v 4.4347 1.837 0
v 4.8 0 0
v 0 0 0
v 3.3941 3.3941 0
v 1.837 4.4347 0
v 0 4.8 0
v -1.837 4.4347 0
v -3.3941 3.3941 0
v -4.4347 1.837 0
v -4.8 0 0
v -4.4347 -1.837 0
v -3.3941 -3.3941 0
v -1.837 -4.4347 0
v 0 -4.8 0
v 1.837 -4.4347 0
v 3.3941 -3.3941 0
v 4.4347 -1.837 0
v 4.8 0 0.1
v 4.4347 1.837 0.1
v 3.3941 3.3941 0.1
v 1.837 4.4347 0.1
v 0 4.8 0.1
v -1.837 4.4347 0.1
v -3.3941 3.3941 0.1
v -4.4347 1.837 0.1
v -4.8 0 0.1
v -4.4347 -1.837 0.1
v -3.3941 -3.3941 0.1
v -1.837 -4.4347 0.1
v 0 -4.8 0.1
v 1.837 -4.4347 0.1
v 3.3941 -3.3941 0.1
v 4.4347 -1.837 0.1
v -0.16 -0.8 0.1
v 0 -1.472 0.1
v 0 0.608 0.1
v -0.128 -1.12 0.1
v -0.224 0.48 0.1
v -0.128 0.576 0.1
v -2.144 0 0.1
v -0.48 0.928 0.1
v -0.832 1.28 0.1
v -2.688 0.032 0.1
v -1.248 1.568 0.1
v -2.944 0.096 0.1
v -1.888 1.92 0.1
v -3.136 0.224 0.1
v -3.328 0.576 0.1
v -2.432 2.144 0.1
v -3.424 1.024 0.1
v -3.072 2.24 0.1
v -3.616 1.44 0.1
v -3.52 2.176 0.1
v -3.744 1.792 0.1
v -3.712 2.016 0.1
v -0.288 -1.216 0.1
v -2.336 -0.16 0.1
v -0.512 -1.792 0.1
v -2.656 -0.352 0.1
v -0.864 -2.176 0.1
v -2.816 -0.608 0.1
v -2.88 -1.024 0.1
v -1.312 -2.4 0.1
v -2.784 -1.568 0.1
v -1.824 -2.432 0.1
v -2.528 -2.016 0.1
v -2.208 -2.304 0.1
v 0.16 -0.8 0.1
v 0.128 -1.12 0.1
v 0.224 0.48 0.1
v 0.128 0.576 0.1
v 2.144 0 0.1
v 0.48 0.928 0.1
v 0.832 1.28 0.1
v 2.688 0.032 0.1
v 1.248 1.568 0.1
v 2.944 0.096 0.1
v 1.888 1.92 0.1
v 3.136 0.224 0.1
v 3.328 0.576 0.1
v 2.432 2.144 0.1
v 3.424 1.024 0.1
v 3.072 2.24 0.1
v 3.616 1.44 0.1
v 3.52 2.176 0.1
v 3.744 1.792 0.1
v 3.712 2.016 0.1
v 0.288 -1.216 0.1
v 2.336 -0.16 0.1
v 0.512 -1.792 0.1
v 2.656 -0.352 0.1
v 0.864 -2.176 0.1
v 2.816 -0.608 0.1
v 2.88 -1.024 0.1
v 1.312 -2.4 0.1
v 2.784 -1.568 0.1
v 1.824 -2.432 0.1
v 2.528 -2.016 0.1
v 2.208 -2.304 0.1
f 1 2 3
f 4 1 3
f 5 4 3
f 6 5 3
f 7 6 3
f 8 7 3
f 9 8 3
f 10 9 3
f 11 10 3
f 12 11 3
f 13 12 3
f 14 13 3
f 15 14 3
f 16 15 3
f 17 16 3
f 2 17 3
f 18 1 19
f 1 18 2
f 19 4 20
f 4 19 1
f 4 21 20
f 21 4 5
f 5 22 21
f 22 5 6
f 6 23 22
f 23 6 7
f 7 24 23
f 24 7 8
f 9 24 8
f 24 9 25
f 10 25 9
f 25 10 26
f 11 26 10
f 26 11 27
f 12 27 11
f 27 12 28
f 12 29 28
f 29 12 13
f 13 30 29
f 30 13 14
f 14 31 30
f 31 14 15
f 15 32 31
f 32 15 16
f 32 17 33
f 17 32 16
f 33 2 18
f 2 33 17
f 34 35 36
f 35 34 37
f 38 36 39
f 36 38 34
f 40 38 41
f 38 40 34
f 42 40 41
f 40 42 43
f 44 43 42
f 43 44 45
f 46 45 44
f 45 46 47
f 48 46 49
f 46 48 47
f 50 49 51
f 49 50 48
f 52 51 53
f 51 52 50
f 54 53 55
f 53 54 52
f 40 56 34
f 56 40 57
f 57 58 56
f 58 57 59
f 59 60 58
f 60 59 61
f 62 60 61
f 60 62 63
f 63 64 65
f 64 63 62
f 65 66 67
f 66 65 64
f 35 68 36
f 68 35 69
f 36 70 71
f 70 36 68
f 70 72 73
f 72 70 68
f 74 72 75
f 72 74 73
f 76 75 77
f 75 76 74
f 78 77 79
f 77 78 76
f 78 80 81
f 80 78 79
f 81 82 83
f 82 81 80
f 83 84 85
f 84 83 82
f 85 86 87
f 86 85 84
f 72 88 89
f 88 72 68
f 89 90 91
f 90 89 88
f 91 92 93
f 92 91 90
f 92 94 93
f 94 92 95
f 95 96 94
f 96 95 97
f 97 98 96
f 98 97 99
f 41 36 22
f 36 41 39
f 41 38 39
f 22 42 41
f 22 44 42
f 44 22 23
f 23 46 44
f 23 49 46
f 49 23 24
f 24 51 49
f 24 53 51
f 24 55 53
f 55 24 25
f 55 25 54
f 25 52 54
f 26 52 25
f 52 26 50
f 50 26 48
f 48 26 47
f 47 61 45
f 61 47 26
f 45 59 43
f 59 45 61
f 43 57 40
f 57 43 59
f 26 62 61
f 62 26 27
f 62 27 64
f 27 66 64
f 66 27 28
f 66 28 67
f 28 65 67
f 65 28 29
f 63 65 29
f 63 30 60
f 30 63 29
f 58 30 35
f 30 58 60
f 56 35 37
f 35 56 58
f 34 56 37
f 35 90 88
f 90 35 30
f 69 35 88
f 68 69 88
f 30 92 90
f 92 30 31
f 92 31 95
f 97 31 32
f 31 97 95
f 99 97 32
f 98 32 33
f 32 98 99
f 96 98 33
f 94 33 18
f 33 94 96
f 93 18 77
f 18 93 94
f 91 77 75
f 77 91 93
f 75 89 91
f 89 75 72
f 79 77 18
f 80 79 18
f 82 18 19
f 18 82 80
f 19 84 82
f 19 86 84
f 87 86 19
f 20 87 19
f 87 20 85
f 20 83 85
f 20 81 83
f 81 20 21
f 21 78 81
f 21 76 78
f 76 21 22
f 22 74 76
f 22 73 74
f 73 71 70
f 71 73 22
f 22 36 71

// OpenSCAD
// file: ../p/empty.scad
use <../lib.scad>
function ldraw_lib__empty() = [
// 0 Empty
// 0 Name: empty.dat
// 0 Author: Steffen [Steffen]
// 0 !LDRAW_ORG Primitive UPDATE 2015-01
// 0 !LICENSE Licensed under CC BY 4.0 : see CAreadme.txt
// 
// 0 BFC CERTIFY CCW
  [0,"BFC","CERTIFY"],
  [0,"BFC","CCW"],
// 
// 0 !HISTORY 2015-10-11 [PTadmin] Official Update 2015-01
// 
// 
// 0 // Tool MLCad cannot handle really empty files. This file is used as a workaround.
// 0 // It exceptionally contains forbidden non-LDRAW standard syntax to satisfy MLCad until it is fixed OR a different editor has become the de-facto LDRAW standard.
// 0 // The line being used here is an "impossible" conditional line which never should be visible,
// 0 // additionally hidden by a syntax explicitly hiding it from displaying.
// 
// 0 MLCAD HIDE 5 24 0 0 0 0.0001 0 0 0.0001 -0.0001 0 0 0 0
];
module ldraw_lib__empty(step=0, col=false, unit=2/5, alt=false, line=0.2, solid=!$preview)
    makepoly(ldraw_lib__empty(), step=step, col=col, unit=unit, alt=alt, line=line, solid=solid);
ldraw_lib__empty(line=0.2);
// file: ../p/1-16chrd.scad
use <../lib.scad>
use <empty.scad>
function ldraw_lib__1_16chrd() = [
// 0 Chord 0.0625
// 0 Name: 1-16chrd.dat
// 0 Author: Philippe Hurbain [Philo]
// 0 !LDRAW_ORG Primitive UPDATE 2015-01
// 0 !LICENSE Licensed under CC BY 4.0 : see CAreadme.txt
// 
// 0 BFC CERTIFY CCW
  [0,"BFC","CERTIFY"],
  [0,"BFC","CCW"],
// 
// 0 !HISTORY 2015-10-11 [PTadmin] Official Update 2015-01
// 
// 
// 0 // This file is intentionally empty because at the current \P resolution,
// 0 // an 1-16chrd is actually empty. However, this file still is present
// 0 // to allow tools to do primitives substition and fill in a real chrd here,
// 0 // or, if desired, to substitute this with the hi-res 48\1-16chrd.
// 
// 0 // This file is based on an idea by Darats at http://forums.ldraw.org/read.php?19,14500,14500#msg-14500
// 
// 1 16 0 0 0 1 0 0 0 1 0 0 0 1 empty.dat
  [1,16,0,0,0,1,0,0,0,1,0,0,0,1, ldraw_lib__empty()],
];
module ldraw_lib__1_16chrd(step=0, col=false, unit=2/5, alt=false, line=0.2, solid=!$preview)
    makepoly(ldraw_lib__1_16chrd(), step=step, col=col, unit=unit, alt=alt, line=line, solid=solid);
ldraw_lib__1_16chrd(line=0.2);
// file: ../p/4-4ering.scad
use <../lib.scad>
use <1-16chrd.scad>
function ldraw_lib__4_4ering() = [
// 0 Adapter Ring Triangles to Normal 1.0
// 0 Name: 4-4ering.dat
// 0 Author: Philippe Hurbain [Philo]
// 0 !LDRAW_ORG Primitive UPDATE 2015-01
// 0 !LICENSE Licensed under CC BY 4.0 : see CAreadme.txt
// 
// 0 BFC CERTIFY CCW
  [0,"BFC","CERTIFY"],
  [0,"BFC","CCW"],
// 
// 0 !HISTORY 2015-10-11 [PTadmin] Official Update 2015-01
// 
// 
// 0 // This file uses 1-16chrd (actually empty). It allows
// 0 // tools to do primitives substition and fill in a ring of chrd here,
// 0 // or, if desired, to substitute this with the hi-res 48\1-16chrd.
// 0 // This file is based on an idea by Darats at http://forums.ldraw.org/read.php?19,14500,14500#msg-14500
// 
// 1 16 0 0 0 1 0 0 0 1 0 0 0 1 1-16chrd.dat
  [1,16,0,0,0,1,0,0,0,1,0,0,0,1, ldraw_lib__1_16chrd()],
// 1 16 0 0 0 0.92388 0 0.38268 0 1 0 -0.38268 0 0.92388 1-16chrd.dat
  [1,16,0,0,0,0.92388,0,0.38268,0,1,0,-0.38268,0,0.92388, ldraw_lib__1_16chrd()],
// 1 16 0 0 0 0.70711 0 0.70711 0 1 0 -0.70711 0 0.70711 1-16chrd.dat
  [1,16,0,0,0,0.70711,0,0.70711,0,1,0,-0.70711,0,0.70711, ldraw_lib__1_16chrd()],
// 1 16 0 0 0 0.38268 0 0.92388 0 1 0 -0.92388 0 0.38268 1-16chrd.dat
  [1,16,0,0,0,0.38268,0,0.92388,0,1,0,-0.92388,0,0.38268, ldraw_lib__1_16chrd()],
// 1 16 0 0 0 0 0 1 0 1 0 -1 0 0 1-16chrd.dat
  [1,16,0,0,0,0,0,1,0,1,0,-1,0,0, ldraw_lib__1_16chrd()],
// 1 16 0 0 0 -0.38268 0 0.92388 0 1 0 -0.92388 0 -0.38268 1-16chrd.dat
  [1,16,0,0,0,-0.38268,0,0.92388,0,1,0,-0.92388,0,-0.38268, ldraw_lib__1_16chrd()],
// 1 16 0 0 0 -0.70711 0 0.70711 0 1 0 -0.70711 0 -0.70711 1-16chrd.dat
  [1,16,0,0,0,-0.70711,0,0.70711,0,1,0,-0.70711,0,-0.70711, ldraw_lib__1_16chrd()],
// 1 16 0 0 0 -0.92388 0 0.38268 0 1 0 -0.38268 0 -0.92388 1-16chrd.dat
  [1,16,0,0,0,-0.92388,0,0.38268,0,1,0,-0.38268,0,-0.92388, ldraw_lib__1_16chrd()],
// 1 16 0 0 0 0 0 -1 0 1 0 1 0 0 1-16chrd.dat
  [1,16,0,0,0,0,0,-1,0,1,0,1,0,0, ldraw_lib__1_16chrd()],
// 1 16 0 0 0 0.38268 0 -0.92388 0 1 0 0.92388 0 0.38268 1-16chrd.dat
  [1,16,0,0,0,0.38268,0,-0.92388,0,1,0,0.92388,0,0.38268, ldraw_lib__1_16chrd()],
// 1 16 0 0 0 0.70711 0 -0.70711 0 1 0 0.70711 0 0.70711 1-16chrd.dat
  [1,16,0,0,0,0.70711,0,-0.70711,0,1,0,0.70711,0,0.70711, ldraw_lib__1_16chrd()],
// 1 16 0 0 0 0.92388 0 -0.38268 0 1 0 0.38268 0 0.92388 1-16chrd.dat
  [1,16,0,0,0,0.92388,0,-0.38268,0,1,0,0.38268,0,0.92388, ldraw_lib__1_16chrd()],
// 1 16 0 0 0 -1 0 0 0 1 0 0 0 -1 1-16chrd.dat
  [1,16,0,0,0,-1,0,0,0,1,0,0,0,-1, ldraw_lib__1_16chrd()],
// 1 16 0 0 0 -0.92388 0 -0.38268 0 1 0 0.38268 0 -0.92388 1-16chrd.dat
  [1,16,0,0,0,-0.92388,0,-0.38268,0,1,0,0.38268,0,-0.92388, ldraw_lib__1_16chrd()],
// 1 16 0 0 0 -0.70711 0 -0.70711 0 1 0 0.70711 0 -0.70711 1-16chrd.dat
  [1,16,0,0,0,-0.70711,0,-0.70711,0,1,0,0.70711,0,-0.70711, ldraw_lib__1_16chrd()],
// 1 16 0 0 0 -0.38268 0 -0.92388 0 1 0 0.92388 0 -0.38268 1-16chrd.dat
  [1,16,0,0,0,-0.38268,0,-0.92388,0,1,0,0.92388,0,-0.38268, ldraw_lib__1_16chrd()],
];
module ldraw_lib__4_4ering(step=0, col=false, unit=2/5, alt=false, line=0.2, solid=!$preview)
    makepoly(ldraw_lib__4_4ering(), step=step, col=col, unit=unit, alt=alt, line=line, solid=solid);
ldraw_lib__4_4ering(line=0.2);
// file: ../p/4-4disc.scad
use <../lib.scad>
function ldraw_lib__4_4disc() = [
// 0 Disc 1.0
// 0 Name: 4-4disc.dat
// 0 Author: James Jessiman
// 0 !LDRAW_ORG Primitive UPDATE 2002-02
// 0 !LICENSE Licensed under CC BY 4.0 : see CAreadme.txt
// 
// 0 BFC CERTIFY CCW
  [0,"BFC","CERTIFY"],
  [0,"BFC","CCW"],
// 
// 0 !HISTORY 1998-12-15 [PTadmin] Official Update 1998-10
// 0 !HISTORY 2002-03-23 [sbliss] Added BFC statement
// 0 !HISTORY 2002-04-25 [PTadmin] Official Update 2002-02
// 0 !HISTORY 2007-06-24 [PTadmin] Header formatted for Contributor Agreement
// 0 !HISTORY 2008-07-01 [PTadmin] Official Update 2008-01
// 
// 
// 3 16 0 0 0 1 0 0 0.9239 0 0.3827
  [3,16,0,0,0,1,0,0,0.9239,0,0.3827],
// 3 16 0 0 0 0.9239 0 0.3827 0.7071 0 0.7071
  [3,16,0,0,0,0.9239,0,0.3827,0.7071,0,0.7071],
// 3 16 0 0 0 0.7071 0 0.7071 0.3827 0 0.9239
  [3,16,0,0,0,0.7071,0,0.7071,0.3827,0,0.9239],
// 3 16 0 0 0 0.3827 0 0.9239 0 0 1
  [3,16,0,0,0,0.3827,0,0.9239,0,0,1],
// 3 16 0 0 0 0 0 1 -0.3827 0 0.9239
  [3,16,0,0,0,0,0,1,-0.3827,0,0.9239],
// 3 16 0 0 0 -0.3827 0 0.9239 -0.7071 0 0.7071
  [3,16,0,0,0,-0.3827,0,0.9239,-0.7071,0,0.7071],
// 3 16 0 0 0 -0.7071 0 0.7071 -0.9239 0 0.3827
  [3,16,0,0,0,-0.7071,0,0.7071,-0.9239,0,0.3827],
// 3 16 0 0 0 -0.9239 0 0.3827 -1 0 -0
  [3,16,0,0,0,-0.9239,0,0.3827,-1,0,-0],
// 3 16 0 0 0 -1 0 -0 -0.9239 0 -0.3827
  [3,16,0,0,0,-1,0,-0,-0.9239,0,-0.3827],
// 3 16 0 0 0 -0.9239 0 -0.3827 -0.7071 0 -0.7071
  [3,16,0,0,0,-0.9239,0,-0.3827,-0.7071,0,-0.7071],
// 3 16 0 0 0 -0.7071 0 -0.7071 -0.3827 0 -0.9239
  [3,16,0,0,0,-0.7071,0,-0.7071,-0.3827,0,-0.9239],
// 3 16 0 0 0 -0.3827 0 -0.9239 0 0 -1
  [3,16,0,0,0,-0.3827,0,-0.9239,0,0,-1],
// 3 16 0 0 0 0 0 -1 0.3827 0 -0.9239
  [3,16,0,0,0,0,0,-1,0.3827,0,-0.9239],
// 3 16 0 0 0 0.3827 0 -0.9239 0.7071 0 -0.7071
  [3,16,0,0,0,0.3827,0,-0.9239,0.7071,0,-0.7071],
// 3 16 0 0 0 0.7071 0 -0.7071 0.9239 0 -0.3827
  [3,16,0,0,0,0.7071,0,-0.7071,0.9239,0,-0.3827],
// 3 16 0 0 0 0.9239 0 -0.3827 1 0 0
  [3,16,0,0,0,0.9239,0,-0.3827,1,0,0],
// 0
];
module ldraw_lib__4_4disc(step=0, col=false, unit=2/5, alt=false, line=0.2, solid=!$preview)
    makepoly(ldraw_lib__4_4disc(), step=step, col=col, unit=unit, alt=alt, line=line, solid=solid);
ldraw_lib__4_4disc(line=0.2);
// file: ../p/4-4cyli.scad
use <../lib.scad>
function ldraw_lib__4_4cyli() = [
// 0 Cylinder 1.0
// 0 Name: 4-4cyli.dat
// 0 Author: James Jessiman
// 0 !LDRAW_ORG Primitive UPDATE 2005-01
// 0 !LICENSE Licensed under CC BY 4.0 : see CAreadme.txt
// 
// 0 BFC CERTIFY CCW
  [0,"BFC","CERTIFY"],
  [0,"BFC","CCW"],
// 
// 0 !HISTORY 1998-12-15 [PTadmin] Official Update 1998-10
// 0 !HISTORY 2002-03-23 [sbliss] Added BFC statement; merged headers from files in distributions LDraw 0.27 and Complete.
// 0 !HISTORY 2002-04-25 [PTadmin] Official Update 2002-02
// 0 !HISTORY 2004-12-14 [guyvivan] BFC CCW
// 0 !HISTORY 2005-12-28 [PTadmin] Official Update 2005-01
// 0 !HISTORY 2007-06-24 [PTadmin] Header formatted for Contributor Agreement
// 0 !HISTORY 2008-07-01 [PTadmin] Official Update 2008-01
// 
// 
// 4 16 1 1 0 0.9239 1 0.3827 0.9239 0 0.3827 1 0 0
  [4,16,1,1,0,0.9239,1,0.3827,0.9239,0,0.3827,1,0,0],
// 5 24 1 0 0 1 1 0 0.9239 0 0.3827 0.9239 0 -0.3827
  [5,24,1,0,0,1,1,0,0.9239,0,0.3827,0.9239,0,-0.3827],
// 4 16 0.9239 1 0.3827 0.7071 1 0.7071 0.7071 0 0.7071 0.9239 0 0.3827
  [4,16,0.9239,1,0.3827,0.7071,1,0.7071,0.7071,0,0.7071,0.9239,0,0.3827],
// 5 24 0.9239 0 0.3827 0.9239 1 0.3827 0.7071 0 0.7071 1 0 0
  [5,24,0.9239,0,0.3827,0.9239,1,0.3827,0.7071,0,0.7071,1,0,0],
// 4 16 0.7071 1 0.7071 0.3827 1 0.9239 0.3827 0 0.9239 0.7071 0 0.7071
  [4,16,0.7071,1,0.7071,0.3827,1,0.9239,0.3827,0,0.9239,0.7071,0,0.7071],
// 5 24 0.7071 0 0.7071 0.7071 1 0.7071 0.3827 0 0.9239 0.9239 0 0.3827
  [5,24,0.7071,0,0.7071,0.7071,1,0.7071,0.3827,0,0.9239,0.9239,0,0.3827],
// 4 16 0.3827 1 0.9239 0 1 1 0 0 1 0.3827 0 0.9239
  [4,16,0.3827,1,0.9239,0,1,1,0,0,1,0.3827,0,0.9239],
// 5 24 0.3827 0 0.9239 0.3827 1 0.9239 0 0 1 0.7071 0 0.7071
  [5,24,0.3827,0,0.9239,0.3827,1,0.9239,0,0,1,0.7071,0,0.7071],
// 4 16 0 1 1 -0.3827 1 0.9239 -0.3827 0 0.9239 0 0 1
  [4,16,0,1,1,-0.3827,1,0.9239,-0.3827,0,0.9239,0,0,1],
// 5 24 0 0 1 0 1 1 -0.3827 0 0.9239 0.3827 0 0.9239
  [5,24,0,0,1,0,1,1,-0.3827,0,0.9239,0.3827,0,0.9239],
// 4 16 -0.3827 1 0.9239 -0.7071 1 0.7071 -0.7071 0 0.7071 -0.3827 0 0.9239
  [4,16,-0.3827,1,0.9239,-0.7071,1,0.7071,-0.7071,0,0.7071,-0.3827,0,0.9239],
// 5 24 -0.3827 0 0.9239 -0.3827 1 0.9239 -0.7071 0 0.7071 0 0 1
  [5,24,-0.3827,0,0.9239,-0.3827,1,0.9239,-0.7071,0,0.7071,0,0,1],
// 4 16 -0.7071 1 0.7071 -0.9239 1 0.3827 -0.9239 0 0.3827 -0.7071 0 0.7071
  [4,16,-0.7071,1,0.7071,-0.9239,1,0.3827,-0.9239,0,0.3827,-0.7071,0,0.7071],
// 5 24 -0.7071 0 0.7071 -0.7071 1 0.7071 -0.9239 0 0.3827 -0.3827 0 0.9239
  [5,24,-0.7071,0,0.7071,-0.7071,1,0.7071,-0.9239,0,0.3827,-0.3827,0,0.9239],
// 4 16 -0.9239 1 0.3827 -1 1 0 -1 0 0 -0.9239 0 0.3827
  [4,16,-0.9239,1,0.3827,-1,1,0,-1,0,0,-0.9239,0,0.3827],
// 5 24 -0.9239 0 0.3827 -0.9239 1 0.3827 -1 0 0 -0.7071 0 0.7071
  [5,24,-0.9239,0,0.3827,-0.9239,1,0.3827,-1,0,0,-0.7071,0,0.7071],
// 4 16 -1 1 0 -0.9239 1 -0.3827 -0.9239 0 -0.3827 -1 0 0
  [4,16,-1,1,0,-0.9239,1,-0.3827,-0.9239,0,-0.3827,-1,0,0],
// 5 24 -1 0 0 -1 1 0 -0.9239 0 -0.3827 -0.9239 0 0.3827
  [5,24,-1,0,0,-1,1,0,-0.9239,0,-0.3827,-0.9239,0,0.3827],
// 4 16 -0.9239 1 -0.3827 -0.7071 1 -0.7071 -0.7071 0 -0.7071 -0.9239 0 -0.3827
  [4,16,-0.9239,1,-0.3827,-0.7071,1,-0.7071,-0.7071,0,-0.7071,-0.9239,0,-0.3827],
// 5 24 -0.9239 0 -0.3827 -0.9239 1 -0.3827 -0.7071 0 -0.7071 -1 0 0
  [5,24,-0.9239,0,-0.3827,-0.9239,1,-0.3827,-0.7071,0,-0.7071,-1,0,0],
// 4 16 -0.7071 1 -0.7071 -0.3827 1 -0.9239 -0.3827 0 -0.9239 -0.7071 0 -0.7071
  [4,16,-0.7071,1,-0.7071,-0.3827,1,-0.9239,-0.3827,0,-0.9239,-0.7071,0,-0.7071],
// 5 24 -0.7071 0 -0.7071 -0.7071 1 -0.7071 -0.3827 0 -0.9239 -0.9239 0 -0.3827
  [5,24,-0.7071,0,-0.7071,-0.7071,1,-0.7071,-0.3827,0,-0.9239,-0.9239,0,-0.3827],
// 4 16 -0.3827 1 -0.9239 0 1 -1 0 0 -1 -0.3827 0 -0.9239
  [4,16,-0.3827,1,-0.9239,0,1,-1,0,0,-1,-0.3827,0,-0.9239],
// 5 24 -0.3827 0 -0.9239 -0.3827 1 -0.9239 0 0 -1 -0.7071 0 -0.7071
  [5,24,-0.3827,0,-0.9239,-0.3827,1,-0.9239,0,0,-1,-0.7071,0,-0.7071],
// 4 16 0 1 -1 0.3827 1 -0.9239 0.3827 0 -0.9239 0 0 -1
  [4,16,0,1,-1,0.3827,1,-0.9239,0.3827,0,-0.9239,0,0,-1],
// 5 24 0 0 -1 0 1 -1 0.3827 0 -0.9239 -0.3827 0 -0.9239
  [5,24,0,0,-1,0,1,-1,0.3827,0,-0.9239,-0.3827,0,-0.9239],
// 4 16 0.3827 1 -0.9239 0.7071 1 -0.7071 0.7071 0 -0.7071 0.3827 0 -0.9239
  [4,16,0.3827,1,-0.9239,0.7071,1,-0.7071,0.7071,0,-0.7071,0.3827,0,-0.9239],
// 5 24 0.3827 0 -0.9239 0.3827 1 -0.9239 0.7071 0 -0.7071 0 0 -1
  [5,24,0.3827,0,-0.9239,0.3827,1,-0.9239,0.7071,0,-0.7071,0,0,-1],
// 4 16 0.7071 1 -0.7071 0.9239 1 -0.3827 0.9239 0 -0.3827 0.7071 0 -0.7071
  [4,16,0.7071,1,-0.7071,0.9239,1,-0.3827,0.9239,0,-0.3827,0.7071,0,-0.7071],
// 5 24 0.7071 0 -0.7071 0.7071 1 -0.7071 0.9239 0 -0.3827 0.3827 0 -0.9239
  [5,24,0.7071,0,-0.7071,0.7071,1,-0.7071,0.9239,0,-0.3827,0.3827,0,-0.9239],
// 4 16 0.9239 1 -0.3827 1 1 0 1 0 0 0.9239 0 -0.3827
  [4,16,0.9239,1,-0.3827,1,1,0,1,0,0,0.9239,0,-0.3827],
// 5 24 0.9239 0 -0.3827 0.9239 1 -0.3827 1 0 0 0.7071 0 -0.7071
  [5,24,0.9239,0,-0.3827,0.9239,1,-0.3827,1,0,0,0.7071,0,-0.7071],
// 0
];
module ldraw_lib__4_4cyli(step=0, col=false, unit=2/5, alt=false, line=0.2, solid=!$preview)
    makepoly(ldraw_lib__4_4cyli(), step=step, col=col, unit=unit, alt=alt, line=line, solid=solid);
ldraw_lib__4_4cyli(line=0.2);
// file: s/4650854is02.scad
use <../../lib.scad>
function ldraw_lib__s__4650854is02() = [
// 0 ~Sticker  0.9 x  1.3 with Butterfly - Shape
// 0 Name: s\4650854is02.dat
// 0 Author: Takeshi Takahashi [RainbowDolphin]
// 0 !LDRAW_ORG Subpart UPDATE 2024-04
// 0 !LICENSE Licensed under CC BY 4.0 : see CAreadme.txt
// 
// 0 BFC CERTIFY CCW
  [0,"BFC","CERTIFY"],
  [0,"BFC","CCW"],
// 
// 0 !HISTORY 2024-05-28 [OrionP] Official Update 2024-04
// 
// 
// 4 16 -.5 -.25 -2.5 -.4 -.25 -3.5 0 -.25 -4.6 0 -.25 1.9
  [4,16,-.5,-.25,-2.5,-.4,-.25,-3.5,0,-.25,-4.6,0,-.25,1.9],
// 4 16 -.5 -.25 -2.5 0 -.25 1.9 -.4 -.25 1.8 -.7 -.25 1.5
  [4,16,-.5,-.25,-2.5,0,-.25,1.9,-.4,-.25,1.8,-.7,-.25,1.5],
// 4 16 -6.7 -.25 0 -.5 -.25 -2.5 -.7 -.25 1.5 -1.5 -.25 2.9
  [4,16,-6.7,-.25,0,-.5,-.25,-2.5,-.7,-.25,1.5,-1.5,-.25,2.9],
// 4 16 -8.4 -.25 .1 -6.7 -.25 0 -1.5 -.25 2.9 -2.6 -.25 4
  [4,16,-8.4,-.25,.1,-6.7,-.25,0,-1.5,-.25,2.9,-2.6,-.25,4],
// 4 16 -9.2 -.25 .3 -8.4 -.25 .1 -2.6 -.25 4 -3.9 -.25 4.9
  [4,16,-9.2,-.25,.3,-8.4,-.25,.1,-2.6,-.25,4,-3.9,-.25,4.9],
// 4 16 -9.8 -.25 .7 -9.2 -.25 .3 -3.9 -.25 4.9 -5.9 -.25 6
  [4,16,-9.8,-.25,.7,-9.2,-.25,.3,-3.9,-.25,4.9,-5.9,-.25,6],
// 4 16 -10.4 -.25 1.8 -9.8 -.25 .7 -5.9 -.25 6 -7.6 -.25 6.7
  [4,16,-10.4,-.25,1.8,-9.8,-.25,.7,-5.9,-.25,6,-7.6,-.25,6.7],
// 4 16 -10.7 -.25 3.2 -10.4 -.25 1.8 -7.6 -.25 6.7 -9.6 -.25 7
  [4,16,-10.7,-.25,3.2,-10.4,-.25,1.8,-7.6,-.25,6.7,-9.6,-.25,7],
// 4 16 -11.3 -.25 4.5 -10.7 -.25 3.2 -9.6 -.25 7 -11 -.25 6.8
  [4,16,-11.3,-.25,4.5,-10.7,-.25,3.2,-9.6,-.25,7,-11,-.25,6.8],
// 4 16 -11.7 -.25 5.6 -11.3 -.25 4.5 -11 -.25 6.8 -11.6 -.25 6.3
  [4,16,-11.7,-.25,5.6,-11.3,-.25,4.5,-11,-.25,6.8,-11.6,-.25,6.3],
// 4 16 -.5 -.25 -2.5 -6.7 -.25 0 -7.3 -.25 -.5 -.9 -.25 -3.8
  [4,16,-.5,-.25,-2.5,-6.7,-.25,0,-7.3,-.25,-.5,-.9,-.25,-3.8],
// 4 16 -.9 -.25 -3.8 -7.3 -.25 -.5 -8.3 -.25 -1.1 -1.6 -.25 -5.6
  [4,16,-.9,-.25,-3.8,-7.3,-.25,-.5,-8.3,-.25,-1.1,-1.6,-.25,-5.6],
// 4 16 -1.6 -.25 -5.6 -8.3 -.25 -1.1 -8.8 -.25 -1.9 -2.7 -.25 -6.8
  [4,16,-1.6,-.25,-5.6,-8.3,-.25,-1.1,-8.8,-.25,-1.9,-2.7,-.25,-6.8],
// 4 16 -2.7 -.25 -6.8 -8.8 -.25 -1.9 -9 -.25 -3.2 -4.1 -.25 -7.5
  [4,16,-2.7,-.25,-6.8,-8.8,-.25,-1.9,-9,-.25,-3.2,-4.1,-.25,-7.5],
// 4 16 -4.1 -.25 -7.5 -9 -.25 -3.2 -8.7 -.25 -4.9 -5.7 -.25 -7.6
  [4,16,-4.1,-.25,-7.5,-9,-.25,-3.2,-8.7,-.25,-4.9,-5.7,-.25,-7.6],
// 4 16 -5.7 -.25 -7.6 -8.7 -.25 -4.9 -7.9 -.25 -6.3 -6.9 -.25 -7.2
  [4,16,-5.7,-.25,-7.6,-8.7,-.25,-4.9,-7.9,-.25,-6.3,-6.9,-.25,-7.2],
// 4 16 0 -.25 -4.6 .4 -.25 -3.5 .5 -.25 -2.5 0 -.25 1.9
  [4,16,0,-.25,-4.6,.4,-.25,-3.5,.5,-.25,-2.5,0,-.25,1.9],
// 4 16 .4 -.25 1.8 0 -.25 1.9 .5 -.25 -2.5 .7 -.25 1.5
  [4,16,.4,-.25,1.8,0,-.25,1.9,.5,-.25,-2.5,.7,-.25,1.5],
// 4 16 .7 -.25 1.5 .5 -.25 -2.5 6.7 -.25 0 1.5 -.25 2.9
  [4,16,.7,-.25,1.5,.5,-.25,-2.5,6.7,-.25,0,1.5,-.25,2.9],
// 4 16 1.5 -.25 2.9 6.7 -.25 0 8.4 -.25 .1 2.6 -.25 4
  [4,16,1.5,-.25,2.9,6.7,-.25,0,8.4,-.25,.1,2.6,-.25,4],
// 4 16 2.6 -.25 4 8.4 -.25 .1 9.2 -.25 .3 3.9 -.25 4.9
  [4,16,2.6,-.25,4,8.4,-.25,.1,9.2,-.25,.3,3.9,-.25,4.9],
// 4 16 3.9 -.25 4.9 9.2 -.25 .3 9.8 -.25 .7 5.9 -.25 6
  [4,16,3.9,-.25,4.9,9.2,-.25,.3,9.8,-.25,.7,5.9,-.25,6],
// 4 16 5.9 -.25 6 9.8 -.25 .7 10.4 -.25 1.8 7.6 -.25 6.7
  [4,16,5.9,-.25,6,9.8,-.25,.7,10.4,-.25,1.8,7.6,-.25,6.7],
// 4 16 7.6 -.25 6.7 10.4 -.25 1.8 10.7 -.25 3.2 9.6 -.25 7
  [4,16,7.6,-.25,6.7,10.4,-.25,1.8,10.7,-.25,3.2,9.6,-.25,7],
// 4 16 9.6 -.25 7 10.7 -.25 3.2 11.3 -.25 4.5 11 -.25 6.8
  [4,16,9.6,-.25,7,10.7,-.25,3.2,11.3,-.25,4.5,11,-.25,6.8],
// 4 16 11 -.25 6.8 11.3 -.25 4.5 11.7 -.25 5.6 11.6 -.25 6.3
  [4,16,11,-.25,6.8,11.3,-.25,4.5,11.7,-.25,5.6,11.6,-.25,6.3],
// 4 16 7.3 -.25 -.5 6.7 -.25 0 .5 -.25 -2.5 .9 -.25 -3.8
  [4,16,7.3,-.25,-.5,6.7,-.25,0,.5,-.25,-2.5,.9,-.25,-3.8],
// 4 16 8.3 -.25 -1.1 7.3 -.25 -.5 .9 -.25 -3.8 1.6 -.25 -5.6
  [4,16,8.3,-.25,-1.1,7.3,-.25,-.5,.9,-.25,-3.8,1.6,-.25,-5.6],
// 4 16 8.8 -.25 -1.9 8.3 -.25 -1.1 1.6 -.25 -5.6 2.7 -.25 -6.8
  [4,16,8.8,-.25,-1.9,8.3,-.25,-1.1,1.6,-.25,-5.6,2.7,-.25,-6.8],
// 4 16 9 -.25 -3.2 8.8 -.25 -1.9 2.7 -.25 -6.8 4.1 -.25 -7.5
  [4,16,9,-.25,-3.2,8.8,-.25,-1.9,2.7,-.25,-6.8,4.1,-.25,-7.5],
// 4 16 8.7 -.25 -4.9 9 -.25 -3.2 4.1 -.25 -7.5 5.7 -.25 -7.6
  [4,16,8.7,-.25,-4.9,9,-.25,-3.2,4.1,-.25,-7.5,5.7,-.25,-7.6],
// 4 16 7.9 -.25 -6.3 8.7 -.25 -4.9 5.7 -.25 -7.6 6.9 -.25 -7.2
  [4,16,7.9,-.25,-6.3,8.7,-.25,-4.9,5.7,-.25,-7.6,6.9,-.25,-7.2],
];
module ldraw_lib__s__4650854is02(step=0, col=false, unit=2/5, alt=false, line=0.2, solid=!$preview)
    makepoly(ldraw_lib__s__4650854is02(), step=step, col=col, unit=unit, alt=alt, line=line, solid=solid);
ldraw_lib__s__4650854is02(line=0.2);
// file: s/4620860as01.scad
use <../../lib.scad>
use <../../p/4-4ering.scad>
function ldraw_lib__s__4620860as01() = [
// 0 ~Sticker  1.2 x  1.2 Round with Butterfly - Background
// 0 Name: s\4620860as01.dat
// 0 Author: Takeshi Takahashi [RainbowDolphin]
// 0 !LDRAW_ORG Subpart UPDATE 2025-01
// 0 !LICENSE Licensed under CC BY 4.0 : see CAreadme.txt
// 
// 0 BFC CERTIFY CCW
  [0,"BFC","CERTIFY"],
  [0,"BFC","CCW"],
// 
// 0 !HISTORY 2025-01-20 [OrionP] Official Update 2025-01
// 
// 
// 1 16 0 -0.25 0 12 0 0 0 1 0 0 0 12 4-4ering.dat
  [1,16,0,-0.25,0,12,0,0,0,1,0,0,0,12, ldraw_lib__4_4ering()],
// 4 16 -.32 -.25 1.44 0 -.25 1.52 0 -.25 12 -1.2 -.25 2.32
  [4,16,-.32,-.25,1.44,0,-.25,1.52,0,-.25,12,-1.2,-.25,2.32],
// 3 16 -1.2 -.25 2.32 -.56 -.25 1.2 -.32 -.25 1.44
  [3,16,-1.2,-.25,2.32,-.56,-.25,1.2,-.32,-.25,1.44],
// 3 16 0 -.25 12 -2.08 -.25 3.2 -1.2 -.25 2.32
  [3,16,0,-.25,12,-2.08,-.25,3.2,-1.2,-.25,2.32],
// 4 16 -3.12 -.25 3.92 -2.08 -.25 3.2 0 -.25 12 -4.5924 -.25 11.0868
  [4,16,-3.12,-.25,3.92,-2.08,-.25,3.2,0,-.25,12,-4.5924,-.25,11.0868],
// 3 16 -4.5924 -.25 11.0868 -4.72 -.25 4.8 -3.12 -.25 3.92
  [3,16,-4.5924,-.25,11.0868,-4.72,-.25,4.8,-3.12,-.25,3.92],
// 4 16 -6.08 -.25 5.36 -4.72 -.25 4.8 -4.5924 -.25 11.0868 -8.4852 -.25 8.4852
  [4,16,-6.08,-.25,5.36,-4.72,-.25,4.8,-4.5924,-.25,11.0868,-8.4852,-.25,8.4852],
// 3 16 -8.4852 -.25 8.4852 -7.68 -.25 5.6 -6.08 -.25 5.36
  [3,16,-8.4852,-.25,8.4852,-7.68,-.25,5.6,-6.08,-.25,5.36],
// 3 16 -8.4852 -.25 8.4852 -8.8 -.25 5.44 -7.68 -.25 5.6
  [3,16,-8.4852,-.25,8.4852,-8.8,-.25,5.44,-7.68,-.25,5.6],
// 4 16 -9.28 -.25 5.04 -8.8 -.25 5.44 -8.4852 -.25 8.4852 -11.0868 -.25 4.5924
  [4,16,-9.28,-.25,5.04,-8.8,-.25,5.44,-8.4852,-.25,8.4852,-11.0868,-.25,4.5924],
// 3 16 -9.28 -.25 5.04 -11.0868 -.25 4.5924 -9.36 -.25 4.48
  [3,16,-9.28,-.25,5.04,-11.0868,-.25,4.5924,-9.36,-.25,4.48],
// 3 16 -11.0868 -.25 4.5924 -9.04 -.25 3.6 -9.36 -.25 4.48
  [3,16,-11.0868,-.25,4.5924,-9.04,-.25,3.6,-9.36,-.25,4.48],
// 4 16 -8.56 -.25 2.56 -9.04 -.25 3.6 -11.0868 -.25 4.5924 -12 -.25 0
  [4,16,-8.56,-.25,2.56,-9.04,-.25,3.6,-11.0868,-.25,4.5924,-12,-.25,0],
// 3 16 -8.56 -.25 2.56 -12 -.25 0 -8.32 -.25 1.44
  [3,16,-8.56,-.25,2.56,-12,-.25,0,-8.32,-.25,1.44],
// 3 16 -8.32 -.25 1.44 -12 -.25 0 -7.84 -.25 .56
  [3,16,-8.32,-.25,1.44,-12,-.25,0,-7.84,-.25,.56],
// 4 16 -7.36 -.25 .24 -7.84 -.25 .56 -12 -.25 0 -7.04 -.25 -1.52
  [4,16,-7.36,-.25,.24,-7.84,-.25,.56,-12,-.25,0,-7.04,-.25,-1.52],
// 4 16 -7.36 -.25 .24 -7.04 -.25 -1.52 -6.64 -.25 -.88 -6.72 -.25 .08
  [4,16,-7.36,-.25,.24,-7.04,-.25,-1.52,-6.64,-.25,-.88,-6.72,-.25,.08],
// 4 16 -6.72 -.25 .08 -6.64 -.25 -.88 -5.84 -.25 -.4 -5.36 -.25 0
  [4,16,-6.72,-.25,.08,-6.64,-.25,-.88,-5.84,-.25,-.4,-5.36,-.25,0],
// 4 16 -7.2 -.25 -2.56 -7.04 -.25 -1.52 -12 -.25 0 -11.0868 -.25 -4.5924
  [4,16,-7.2,-.25,-2.56,-7.04,-.25,-1.52,-12,-.25,0,-11.0868,-.25,-4.5924],
// 3 16 -7.2 -.25 -2.56 -11.0868 -.25 -4.5924 -6.96 -.25 -3.92
  [3,16,-7.2,-.25,-2.56,-11.0868,-.25,-4.5924,-6.96,-.25,-3.92],
// 4 16 -6.32 -.25 -5.04 -6.96 -.25 -3.92 -11.0868 -.25 -4.5924 -8.4852 -.25 -8.4852
  [4,16,-6.32,-.25,-5.04,-6.96,-.25,-3.92,-11.0868,-.25,-4.5924,-8.4852,-.25,-8.4852],
// 3 16 -6.32 -.25 -5.04 -8.4852 -.25 -8.4852 -5.52 -.25 -5.76
  [3,16,-6.32,-.25,-5.04,-8.4852,-.25,-8.4852,-5.52,-.25,-5.76],
// 4 16 -4.56 -.25 -6.08 -5.52 -.25 -5.76 -8.4852 -.25 -8.4852 -4.5924 -.25 -11.0868
  [4,16,-4.56,-.25,-6.08,-5.52,-.25,-5.76,-8.4852,-.25,-8.4852,-4.5924,-.25,-11.0868],
// 3 16 -3.28 -.25 -6 -4.56 -.25 -6.08 -4.5924 -.25 -11.0868
  [3,16,-3.28,-.25,-6,-4.56,-.25,-6.08,-4.5924,-.25,-11.0868],
// 4 16 -2.16 -.25 -5.44 -3.28 -.25 -6 -4.5924 -.25 -11.0868 0 -.25 -12
  [4,16,-2.16,-.25,-5.44,-3.28,-.25,-6,-4.5924,-.25,-11.0868,0,-.25,-12],
// 4 16 -1.28 -.25 -4.48 -2.16 -.25 -5.44 0 -.25 -12 0 -.25 -3.68
  [4,16,-1.28,-.25,-4.48,-2.16,-.25,-5.44,0,-.25,-12,0,-.25,-3.68],
// 4 16 -.72 -.25 -3.04 -1.28 -.25 -4.48 0 -.25 -3.68 -.32 -.25 -2.8
  [4,16,-.72,-.25,-3.04,-1.28,-.25,-4.48,0,-.25,-3.68,-.32,-.25,-2.8],
// 3 16 -.4 -.25 -2 -.72 -.25 -3.04 -.32 -.25 -2.8
  [3,16,-.4,-.25,-2,-.72,-.25,-3.04,-.32,-.25,-2.8],
// 4 16 0 -.25 -3.68 0 -.25 -12 1.28 -.25 -4.48 .72 -.25 -3.04
  [4,16,0,-.25,-3.68,0,-.25,-12,1.28,-.25,-4.48,.72,-.25,-3.04],
// 3 16 .32 -.25 -2.8 0 -.25 -3.68 .72 -.25 -3.04
  [3,16,.32,-.25,-2.8,0,-.25,-3.68,.72,-.25,-3.04],
// 3 16 .4 -.25 -2 .32 -.25 -2.8 .72 -.25 -3.04
  [3,16,.4,-.25,-2,.32,-.25,-2.8,.72,-.25,-3.04],
// 4 16 2.16 -.25 -5.44 1.28 -.25 -4.48 0 -.25 -12 4.5924 -.25 -11.0868
  [4,16,2.16,-.25,-5.44,1.28,-.25,-4.48,0,-.25,-12,4.5924,-.25,-11.0868],
// 3 16 2.16 -.25 -5.44 4.5924 -.25 -11.0868 3.28 -.25 -6
  [3,16,2.16,-.25,-5.44,4.5924,-.25,-11.0868,3.28,-.25,-6],
// 4 16 4.56 -.25 -6.08 3.28 -.25 -6 4.5924 -.25 -11.0868 8.4852 -.25 -8.4852
  [4,16,4.56,-.25,-6.08,3.28,-.25,-6,4.5924,-.25,-11.0868,8.4852,-.25,-8.4852],
// 3 16 5.52 -.25 -5.76 4.56 -.25 -6.08 8.4852 -.25 -8.4852
  [3,16,5.52,-.25,-5.76,4.56,-.25,-6.08,8.4852,-.25,-8.4852],
// 4 16 6.32 -.25 -5.04 5.52 -.25 -5.76 8.4852 -.25 -8.4852 11.0868 -.25 -4.5924
  [4,16,6.32,-.25,-5.04,5.52,-.25,-5.76,8.4852,-.25,-8.4852,11.0868,-.25,-4.5924],
// 3 16 6.96 -.25 -3.92 6.32 -.25 -5.04 11.0868 -.25 -4.5924
  [3,16,6.96,-.25,-3.92,6.32,-.25,-5.04,11.0868,-.25,-4.5924],
// 4 16 7.2 -.25 -2.56 6.96 -.25 -3.92 11.0868 -.25 -4.5924 12 -.25 0
  [4,16,7.2,-.25,-2.56,6.96,-.25,-3.92,11.0868,-.25,-4.5924,12,-.25,0],
// 4 16 7.04 -.25 -1.52 7.2 -.25 -2.56 12 -.25 0 7.36 -.25 .24
  [4,16,7.04,-.25,-1.52,7.2,-.25,-2.56,12,-.25,0,7.36,-.25,.24],
// 4 16 6.64 -.25 -.88 7.04 -.25 -1.52 7.36 -.25 .24 6.72 -.25 .08
  [4,16,6.64,-.25,-.88,7.04,-.25,-1.52,7.36,-.25,.24,6.72,-.25,.08],
// 4 16 5.84 -.25 -.4 6.64 -.25 -.88 6.72 -.25 .08 5.36 -.25 0
  [4,16,5.84,-.25,-.4,6.64,-.25,-.88,6.72,-.25,.08,5.36,-.25,0],
// 3 16 7.84 -.25 .56 7.36 -.25 .24 12 -.25 0
  [3,16,7.84,-.25,.56,7.36,-.25,.24,12,-.25,0],
// 3 16 8.32 -.25 1.44 7.84 -.25 .56 12 -.25 0
  [3,16,8.32,-.25,1.44,7.84,-.25,.56,12,-.25,0],
// 4 16 8.56 -.25 2.56 8.32 -.25 1.44 12 -.25 0 11.0868 -.25 4.5924
  [4,16,8.56,-.25,2.56,8.32,-.25,1.44,12,-.25,0,11.0868,-.25,4.5924],
// 3 16 11.0868 -.25 4.5924 9.04 -.25 3.6 8.56 -.25 2.56
  [3,16,11.0868,-.25,4.5924,9.04,-.25,3.6,8.56,-.25,2.56],
// 3 16 11.0868 -.25 4.5924 9.36 -.25 4.48 9.04 -.25 3.6
  [3,16,11.0868,-.25,4.5924,9.36,-.25,4.48,9.04,-.25,3.6],
// 3 16 9.28 -.25 5.04 9.36 -.25 4.48 11.0868 -.25 4.5924
  [3,16,9.28,-.25,5.04,9.36,-.25,4.48,11.0868,-.25,4.5924],
// 4 16 9.28 -.25 5.04 11.0868 -.25 4.5924 8.4852 -.25 8.4852 8.8 -.25 5.44
  [4,16,9.28,-.25,5.04,11.0868,-.25,4.5924,8.4852,-.25,8.4852,8.8,-.25,5.44],
// 3 16 8.4852 -.25 8.4852 7.68 -.25 5.6 8.8 -.25 5.44
  [3,16,8.4852,-.25,8.4852,7.68,-.25,5.6,8.8,-.25,5.44],
// 4 16 6.08 -.25 5.36 7.68 -.25 5.6 8.4852 -.25 8.4852 4.5924 -.25 11.0868
  [4,16,6.08,-.25,5.36,7.68,-.25,5.6,8.4852,-.25,8.4852,4.5924,-.25,11.0868],
// 3 16 4.5924 -.25 11.0868 4.72 -.25 4.8 6.08 -.25 5.36
  [3,16,4.5924,-.25,11.0868,4.72,-.25,4.8,6.08,-.25,5.36],
// 4 16 3.12 -.25 3.92 4.72 -.25 4.8 4.5924 -.25 11.0868 0 -.25 12
  [4,16,3.12,-.25,3.92,4.72,-.25,4.8,4.5924,-.25,11.0868,0,-.25,12],
// 3 16 0 -.25 12 2.08 -.25 3.2 3.12 -.25 3.92
  [3,16,0,-.25,12,2.08,-.25,3.2,3.12,-.25,3.92],
// 3 16 0 -.25 12 1.2 -.25 2.32 2.08 -.25 3.2
  [3,16,0,-.25,12,1.2,-.25,2.32,2.08,-.25,3.2],
// 4 16 1.2 -.25 2.32 0 -.25 12 .32 -.25 1.44 .56 -.25 1.2
  [4,16,1.2,-.25,2.32,0,-.25,12,.32,-.25,1.44,.56,-.25,1.2],
// 3 16 0 -.25 12 0 -.25 1.52 .32 -.25 1.44
  [3,16,0,-.25,12,0,-.25,1.52,.32,-.25,1.44],
];
module ldraw_lib__s__4620860as01(step=0, col=false, unit=2/5, alt=false, line=0.2, solid=!$preview)
    makepoly(ldraw_lib__s__4620860as01(), step=step, col=col, unit=unit, alt=alt, line=line, solid=solid);
ldraw_lib__s__4620860as01(line=0.2);
// file: ../p/4-4cylc3.scad
use <../lib.scad>
use <4-4cyli.scad>
use <4-4disc.scad>
function ldraw_lib__4_4cylc3() = [
// 0 Cylinder Closed 1.0 without Top or Bottom Edge Lines
// 0 Name: 4-4cylc3.dat
// 0 Author: Chris Dee [cwdee]
// 0 !LDRAW_ORG Primitive UPDATE 2017-01
// 0 !LICENSE Licensed under CC BY 4.0 : see CAreadme.txt
// 
// 0 BFC CERTIFY CCW
  [0,"BFC","CERTIFY"],
  [0,"BFC","CCW"],
// 
// 0 !HISTORY 2017-12-30 [PTadmin] Official Update 2017-01
// 
// 
// 1 16 0 0 0 1 0 0 0 1 0 0 0 1 4-4disc.dat
  [1,16,0,0,0,1,0,0,0,1,0,0,0,1, ldraw_lib__4_4disc()],
// 1 16 0 0 0 1 0 0 0 1 0 0 0 1 4-4cyli.dat
  [1,16,0,0,0,1,0,0,0,1,0,0,0,1, ldraw_lib__4_4cyli()],
// 0
];
module ldraw_lib__4_4cylc3(step=0, col=false, unit=2/5, alt=false, line=0.2, solid=!$preview)
    makepoly(ldraw_lib__4_4cylc3(), step=step, col=col, unit=unit, alt=alt, line=line, solid=solid);
ldraw_lib__4_4cylc3(line=0.2);
// main file
use <../lib.scad>
use <../p/4-4cylc3.scad>
use <s/4620860as01.scad>
use <s/4650854is02.scad>
function ldraw_lib__4620860a() = [
// 0 Sticker  1.2 x  1.2 Round with Yellow Butterfly on White Background
// 0 Name: 4620860a.dat
// 0 Author: Takeshi Takahashi [RainbowDolphin]
// 0 !LDRAW_ORG Part UPDATE 2025-01
// 0 !LICENSE Licensed under CC BY 4.0 : see CAreadme.txt
// 
// 0 BFC CERTIFY CCW
  [0,"BFC","CERTIFY"],
  [0,"BFC","CCW"],
// 
// 0 !KEYWORDS Bricklink 3315stk01, Brickowl 604777, house, Olivia
// 0 !KEYWORDS Rebrickable 95460, set 3315
// 
// 0 !HISTORY 2025-01-20 [OrionP] Official Update 2025-01
// 
// 
// 1 16 0 0 0 12 0 0 0 -0.25 0 0 0 12 4-4cylc3.dat
  [1,16,0,0,0,12,0,0,0,-0.25,0,0,0,12, ldraw_lib__4_4cylc3()],
// 1 14 0 0 0 0.8 0 0 0 1 0 0 0 0.8 s\4650854is02.dat
  [1,14,0,0,0,0.8,0,0,0,1,0,0,0,0.8, ldraw_lib__s__4650854is02()],
// 1 15 0 0 0 1 0 0 0 1 0 0 0 1 s\4620860as01.dat
  [1,15,0,0,0,1,0,0,0,1,0,0,0,1, ldraw_lib__s__4620860as01()],
];
module ldraw_lib__4620860a(step=0, col=false, unit=2/5, alt=false, line=0.2, solid=!$preview)
    makepoly(ldraw_lib__4620860a(), step=step, col=col, unit=unit, alt=alt, line=line, solid=solid);
ldraw_lib__4620860a(line=0.2);
